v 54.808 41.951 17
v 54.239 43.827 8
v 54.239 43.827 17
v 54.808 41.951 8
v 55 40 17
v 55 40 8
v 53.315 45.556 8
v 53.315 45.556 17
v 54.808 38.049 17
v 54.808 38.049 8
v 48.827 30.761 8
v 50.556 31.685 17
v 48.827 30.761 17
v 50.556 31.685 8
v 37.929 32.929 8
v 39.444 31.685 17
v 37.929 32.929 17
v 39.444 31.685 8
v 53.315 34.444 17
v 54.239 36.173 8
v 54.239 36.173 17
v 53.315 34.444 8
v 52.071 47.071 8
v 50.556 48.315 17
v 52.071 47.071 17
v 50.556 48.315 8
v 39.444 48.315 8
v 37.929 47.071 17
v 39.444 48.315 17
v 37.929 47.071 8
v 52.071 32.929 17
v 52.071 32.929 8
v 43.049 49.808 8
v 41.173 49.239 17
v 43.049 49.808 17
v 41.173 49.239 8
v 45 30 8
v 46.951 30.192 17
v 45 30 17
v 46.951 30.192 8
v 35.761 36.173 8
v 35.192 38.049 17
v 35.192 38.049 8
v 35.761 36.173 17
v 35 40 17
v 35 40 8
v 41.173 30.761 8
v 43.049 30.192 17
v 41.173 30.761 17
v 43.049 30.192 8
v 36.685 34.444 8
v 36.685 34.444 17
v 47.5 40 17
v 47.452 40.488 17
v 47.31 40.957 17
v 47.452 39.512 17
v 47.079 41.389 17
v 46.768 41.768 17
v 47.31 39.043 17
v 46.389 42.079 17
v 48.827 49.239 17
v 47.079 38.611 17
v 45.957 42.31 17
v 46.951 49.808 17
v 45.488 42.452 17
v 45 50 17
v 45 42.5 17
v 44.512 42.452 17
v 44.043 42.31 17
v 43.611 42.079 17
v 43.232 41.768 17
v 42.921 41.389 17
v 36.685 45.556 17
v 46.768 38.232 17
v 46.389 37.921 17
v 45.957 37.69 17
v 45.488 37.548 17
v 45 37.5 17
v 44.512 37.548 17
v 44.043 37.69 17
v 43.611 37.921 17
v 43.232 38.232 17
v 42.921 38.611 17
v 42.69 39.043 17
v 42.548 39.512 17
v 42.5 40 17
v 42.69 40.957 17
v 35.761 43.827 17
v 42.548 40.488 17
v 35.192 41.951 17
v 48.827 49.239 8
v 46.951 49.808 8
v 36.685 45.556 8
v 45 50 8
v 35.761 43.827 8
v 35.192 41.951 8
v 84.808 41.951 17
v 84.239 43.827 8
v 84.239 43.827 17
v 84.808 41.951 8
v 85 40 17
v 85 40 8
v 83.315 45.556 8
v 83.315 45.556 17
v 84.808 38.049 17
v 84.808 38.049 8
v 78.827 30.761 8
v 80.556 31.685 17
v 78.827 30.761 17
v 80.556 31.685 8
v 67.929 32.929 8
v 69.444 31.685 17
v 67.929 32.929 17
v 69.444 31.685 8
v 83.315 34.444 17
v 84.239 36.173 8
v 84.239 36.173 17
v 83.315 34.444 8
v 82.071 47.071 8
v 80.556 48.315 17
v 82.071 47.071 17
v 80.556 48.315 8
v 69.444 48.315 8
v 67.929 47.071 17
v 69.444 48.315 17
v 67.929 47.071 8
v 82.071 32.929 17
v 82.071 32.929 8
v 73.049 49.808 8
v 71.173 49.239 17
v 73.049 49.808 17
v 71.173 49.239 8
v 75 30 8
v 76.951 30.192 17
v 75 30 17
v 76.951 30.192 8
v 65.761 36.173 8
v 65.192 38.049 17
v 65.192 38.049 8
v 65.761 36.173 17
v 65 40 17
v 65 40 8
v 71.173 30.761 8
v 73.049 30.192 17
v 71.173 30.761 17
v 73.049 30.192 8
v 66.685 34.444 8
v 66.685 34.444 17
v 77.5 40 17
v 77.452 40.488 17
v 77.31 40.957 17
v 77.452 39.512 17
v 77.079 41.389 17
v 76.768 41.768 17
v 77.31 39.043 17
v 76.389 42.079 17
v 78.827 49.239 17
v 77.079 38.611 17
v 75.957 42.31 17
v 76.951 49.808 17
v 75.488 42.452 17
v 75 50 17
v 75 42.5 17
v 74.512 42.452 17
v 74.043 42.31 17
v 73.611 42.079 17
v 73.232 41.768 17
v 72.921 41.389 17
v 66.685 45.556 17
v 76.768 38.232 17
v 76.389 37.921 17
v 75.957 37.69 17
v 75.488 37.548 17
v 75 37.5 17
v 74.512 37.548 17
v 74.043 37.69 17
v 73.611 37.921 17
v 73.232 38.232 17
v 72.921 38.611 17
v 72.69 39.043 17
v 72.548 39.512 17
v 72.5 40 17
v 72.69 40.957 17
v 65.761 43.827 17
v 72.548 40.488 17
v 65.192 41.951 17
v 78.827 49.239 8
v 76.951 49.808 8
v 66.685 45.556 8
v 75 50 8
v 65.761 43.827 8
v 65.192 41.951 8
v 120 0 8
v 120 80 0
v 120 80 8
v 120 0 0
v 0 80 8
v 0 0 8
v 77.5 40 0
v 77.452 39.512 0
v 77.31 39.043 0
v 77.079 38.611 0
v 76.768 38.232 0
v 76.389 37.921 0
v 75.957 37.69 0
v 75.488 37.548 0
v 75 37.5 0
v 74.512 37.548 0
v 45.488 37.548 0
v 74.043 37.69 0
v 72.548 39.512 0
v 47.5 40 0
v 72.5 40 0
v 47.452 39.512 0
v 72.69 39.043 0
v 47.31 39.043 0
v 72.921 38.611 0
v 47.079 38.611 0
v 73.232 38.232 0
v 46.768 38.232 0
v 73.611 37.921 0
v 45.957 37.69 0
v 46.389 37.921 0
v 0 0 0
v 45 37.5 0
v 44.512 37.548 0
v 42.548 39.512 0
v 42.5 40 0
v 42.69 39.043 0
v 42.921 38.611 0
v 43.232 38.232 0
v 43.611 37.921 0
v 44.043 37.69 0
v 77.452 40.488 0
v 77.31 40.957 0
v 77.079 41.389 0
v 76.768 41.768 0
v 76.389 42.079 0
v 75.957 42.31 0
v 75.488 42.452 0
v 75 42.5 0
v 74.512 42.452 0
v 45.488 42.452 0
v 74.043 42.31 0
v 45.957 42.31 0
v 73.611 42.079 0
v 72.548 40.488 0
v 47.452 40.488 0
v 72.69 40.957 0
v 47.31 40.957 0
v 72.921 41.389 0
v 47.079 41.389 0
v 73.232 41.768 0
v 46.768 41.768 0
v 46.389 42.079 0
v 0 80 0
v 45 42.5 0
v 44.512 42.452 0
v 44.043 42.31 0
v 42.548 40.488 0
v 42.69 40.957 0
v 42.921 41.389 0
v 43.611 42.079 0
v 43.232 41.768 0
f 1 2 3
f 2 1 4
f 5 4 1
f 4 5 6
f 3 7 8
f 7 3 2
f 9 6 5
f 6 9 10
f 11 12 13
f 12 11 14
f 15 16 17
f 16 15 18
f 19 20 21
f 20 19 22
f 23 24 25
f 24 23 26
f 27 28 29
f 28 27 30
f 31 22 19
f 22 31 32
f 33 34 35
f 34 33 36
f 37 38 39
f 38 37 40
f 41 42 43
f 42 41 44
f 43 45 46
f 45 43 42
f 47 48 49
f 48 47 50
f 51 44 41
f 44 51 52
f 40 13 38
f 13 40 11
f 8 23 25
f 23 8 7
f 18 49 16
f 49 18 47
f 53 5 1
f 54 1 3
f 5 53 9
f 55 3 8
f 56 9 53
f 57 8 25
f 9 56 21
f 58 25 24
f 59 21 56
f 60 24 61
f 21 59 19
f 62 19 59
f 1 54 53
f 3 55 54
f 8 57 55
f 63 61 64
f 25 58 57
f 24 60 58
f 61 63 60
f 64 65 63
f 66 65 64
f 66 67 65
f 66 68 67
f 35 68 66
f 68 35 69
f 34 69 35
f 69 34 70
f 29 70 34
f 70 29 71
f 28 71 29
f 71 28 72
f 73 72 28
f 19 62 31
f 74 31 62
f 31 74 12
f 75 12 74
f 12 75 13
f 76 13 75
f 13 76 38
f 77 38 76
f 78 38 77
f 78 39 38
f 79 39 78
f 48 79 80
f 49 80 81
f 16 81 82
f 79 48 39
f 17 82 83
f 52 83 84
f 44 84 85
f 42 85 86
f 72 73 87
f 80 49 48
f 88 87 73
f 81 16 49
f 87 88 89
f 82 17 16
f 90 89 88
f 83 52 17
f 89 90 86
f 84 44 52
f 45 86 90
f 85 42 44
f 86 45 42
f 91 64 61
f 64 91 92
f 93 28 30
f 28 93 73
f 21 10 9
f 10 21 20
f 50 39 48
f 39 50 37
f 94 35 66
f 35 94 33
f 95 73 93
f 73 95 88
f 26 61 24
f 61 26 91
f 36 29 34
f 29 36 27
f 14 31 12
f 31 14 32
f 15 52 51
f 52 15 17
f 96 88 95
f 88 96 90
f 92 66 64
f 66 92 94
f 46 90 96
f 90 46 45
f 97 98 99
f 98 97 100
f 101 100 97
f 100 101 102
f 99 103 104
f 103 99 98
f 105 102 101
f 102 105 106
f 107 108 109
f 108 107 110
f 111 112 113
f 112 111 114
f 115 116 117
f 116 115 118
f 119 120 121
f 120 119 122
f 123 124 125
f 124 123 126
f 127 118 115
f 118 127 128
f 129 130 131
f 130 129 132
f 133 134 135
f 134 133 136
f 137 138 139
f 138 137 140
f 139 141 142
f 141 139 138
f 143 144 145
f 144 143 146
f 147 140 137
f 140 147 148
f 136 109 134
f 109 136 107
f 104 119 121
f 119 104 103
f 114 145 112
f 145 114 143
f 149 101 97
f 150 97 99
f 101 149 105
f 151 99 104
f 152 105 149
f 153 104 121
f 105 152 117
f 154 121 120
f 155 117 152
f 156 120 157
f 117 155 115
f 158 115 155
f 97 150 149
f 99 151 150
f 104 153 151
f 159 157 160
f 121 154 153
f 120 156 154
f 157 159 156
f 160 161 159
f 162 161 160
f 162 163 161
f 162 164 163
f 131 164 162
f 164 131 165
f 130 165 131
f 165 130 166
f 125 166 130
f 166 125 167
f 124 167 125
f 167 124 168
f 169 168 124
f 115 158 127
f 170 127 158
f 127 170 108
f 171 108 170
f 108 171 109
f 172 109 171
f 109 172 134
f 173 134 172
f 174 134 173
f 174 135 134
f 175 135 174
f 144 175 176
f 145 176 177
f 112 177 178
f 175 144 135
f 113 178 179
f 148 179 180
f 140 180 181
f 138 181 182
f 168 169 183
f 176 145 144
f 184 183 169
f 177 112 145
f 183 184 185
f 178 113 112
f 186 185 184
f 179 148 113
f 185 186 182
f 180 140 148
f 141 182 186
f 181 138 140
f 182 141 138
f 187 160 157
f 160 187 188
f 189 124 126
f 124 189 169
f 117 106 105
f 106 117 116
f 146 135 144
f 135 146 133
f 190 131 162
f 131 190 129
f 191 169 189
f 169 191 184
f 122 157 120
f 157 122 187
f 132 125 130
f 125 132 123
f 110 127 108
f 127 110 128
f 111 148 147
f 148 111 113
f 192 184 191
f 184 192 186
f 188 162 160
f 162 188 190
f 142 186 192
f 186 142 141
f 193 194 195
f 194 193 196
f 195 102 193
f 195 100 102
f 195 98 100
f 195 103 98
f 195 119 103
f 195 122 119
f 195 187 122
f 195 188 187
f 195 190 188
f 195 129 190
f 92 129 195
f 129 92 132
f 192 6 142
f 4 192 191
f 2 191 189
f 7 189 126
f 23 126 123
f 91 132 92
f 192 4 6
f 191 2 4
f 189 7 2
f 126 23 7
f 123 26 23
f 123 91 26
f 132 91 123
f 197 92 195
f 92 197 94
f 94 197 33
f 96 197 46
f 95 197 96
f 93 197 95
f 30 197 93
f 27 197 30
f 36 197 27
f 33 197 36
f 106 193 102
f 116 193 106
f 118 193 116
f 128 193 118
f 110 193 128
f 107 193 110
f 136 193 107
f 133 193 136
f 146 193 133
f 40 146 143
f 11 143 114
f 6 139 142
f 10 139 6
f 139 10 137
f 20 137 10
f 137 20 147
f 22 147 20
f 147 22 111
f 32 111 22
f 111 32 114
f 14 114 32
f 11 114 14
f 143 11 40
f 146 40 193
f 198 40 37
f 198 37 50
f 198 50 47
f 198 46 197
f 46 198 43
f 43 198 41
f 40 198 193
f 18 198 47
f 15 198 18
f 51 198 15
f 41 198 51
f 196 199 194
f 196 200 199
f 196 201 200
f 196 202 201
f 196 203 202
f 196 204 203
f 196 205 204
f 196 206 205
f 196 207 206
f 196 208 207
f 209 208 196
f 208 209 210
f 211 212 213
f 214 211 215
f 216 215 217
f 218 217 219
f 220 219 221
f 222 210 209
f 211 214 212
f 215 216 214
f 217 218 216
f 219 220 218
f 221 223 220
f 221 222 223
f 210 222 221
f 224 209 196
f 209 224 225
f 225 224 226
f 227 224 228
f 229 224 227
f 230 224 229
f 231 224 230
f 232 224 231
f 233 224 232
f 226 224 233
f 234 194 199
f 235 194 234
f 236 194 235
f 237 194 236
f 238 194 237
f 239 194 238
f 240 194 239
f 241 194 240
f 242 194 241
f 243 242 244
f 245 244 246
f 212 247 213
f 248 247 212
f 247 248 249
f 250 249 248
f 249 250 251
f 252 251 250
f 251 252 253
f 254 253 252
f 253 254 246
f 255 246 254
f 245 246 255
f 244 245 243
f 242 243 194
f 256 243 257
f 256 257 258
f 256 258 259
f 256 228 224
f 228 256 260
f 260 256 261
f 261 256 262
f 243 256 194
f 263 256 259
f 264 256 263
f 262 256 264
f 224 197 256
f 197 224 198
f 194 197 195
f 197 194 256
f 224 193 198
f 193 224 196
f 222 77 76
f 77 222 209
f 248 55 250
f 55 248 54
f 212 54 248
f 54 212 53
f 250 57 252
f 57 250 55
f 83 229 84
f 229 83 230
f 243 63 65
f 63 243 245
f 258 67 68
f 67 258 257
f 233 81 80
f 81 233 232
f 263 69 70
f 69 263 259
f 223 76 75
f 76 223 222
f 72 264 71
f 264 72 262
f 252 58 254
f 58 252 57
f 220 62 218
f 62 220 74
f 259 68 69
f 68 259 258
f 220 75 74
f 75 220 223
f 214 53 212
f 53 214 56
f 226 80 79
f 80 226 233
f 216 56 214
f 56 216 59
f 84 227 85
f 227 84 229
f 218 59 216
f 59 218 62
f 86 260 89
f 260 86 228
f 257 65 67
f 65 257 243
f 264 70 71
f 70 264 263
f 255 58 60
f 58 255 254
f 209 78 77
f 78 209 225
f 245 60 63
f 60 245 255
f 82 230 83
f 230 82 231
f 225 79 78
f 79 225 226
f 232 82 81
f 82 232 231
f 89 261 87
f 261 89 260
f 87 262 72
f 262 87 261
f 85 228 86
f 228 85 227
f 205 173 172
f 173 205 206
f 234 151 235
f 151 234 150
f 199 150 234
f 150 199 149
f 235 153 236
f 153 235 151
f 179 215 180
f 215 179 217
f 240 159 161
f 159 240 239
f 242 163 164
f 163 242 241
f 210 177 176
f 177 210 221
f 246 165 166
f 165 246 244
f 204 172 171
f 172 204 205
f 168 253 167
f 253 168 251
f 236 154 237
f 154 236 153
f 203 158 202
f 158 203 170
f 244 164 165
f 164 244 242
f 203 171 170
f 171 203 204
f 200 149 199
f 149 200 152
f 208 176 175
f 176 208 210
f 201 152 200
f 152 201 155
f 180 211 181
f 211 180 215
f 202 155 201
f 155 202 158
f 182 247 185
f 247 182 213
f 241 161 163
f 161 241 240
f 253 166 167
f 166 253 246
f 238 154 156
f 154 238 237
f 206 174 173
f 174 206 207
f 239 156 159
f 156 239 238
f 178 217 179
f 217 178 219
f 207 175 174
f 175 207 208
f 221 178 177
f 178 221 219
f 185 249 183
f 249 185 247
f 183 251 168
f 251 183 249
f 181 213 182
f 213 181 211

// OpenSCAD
$fn = 32;

// ----------------------------------------------------------------------
// Drill jig: two_boss jig
// ----------------------------------------------------------------------

// --- parameters (mm) ---
plate_l = 120;            // plate length, X
plate_w = 80;             // plate width, Y
plate_t = 8;              // plate thickness
boss_d = 20;              // guide boss diameter
boss_h = 10;              // boss height above the plate
guide_d = 5;              // guide hole diameter
boss_pitch = 30;          // boss pitch
fit_tol = 0.1;            // tolerance for press fits, mm
free_tol = 0.3;           // tolerance for clearance fits, mm

n_boss = 2;  // guide bosses
boss_x0 = (plate_l - (n_boss - 1) * boss_pitch) / 2;  // first boss X
boss_top = plate_t - 1 + boss_h;  // boss crown height
total_h = boss_top;  // overall height

difference() {
  union() {
  cube([plate_l, plate_w, plate_t]);
  for (i = [0 : n_boss - 1])
    translate([boss_x0 + i * boss_pitch, plate_w / 2, plate_t - 1])
      cylinder(h = boss_h, d = boss_d);
  }
  for (i = [0 : n_boss - 1])
    translate([boss_x0 + i * boss_pitch, plate_w / 2, -1])
      cylinder(h = plate_t + boss_h, d = guide_d);
}
